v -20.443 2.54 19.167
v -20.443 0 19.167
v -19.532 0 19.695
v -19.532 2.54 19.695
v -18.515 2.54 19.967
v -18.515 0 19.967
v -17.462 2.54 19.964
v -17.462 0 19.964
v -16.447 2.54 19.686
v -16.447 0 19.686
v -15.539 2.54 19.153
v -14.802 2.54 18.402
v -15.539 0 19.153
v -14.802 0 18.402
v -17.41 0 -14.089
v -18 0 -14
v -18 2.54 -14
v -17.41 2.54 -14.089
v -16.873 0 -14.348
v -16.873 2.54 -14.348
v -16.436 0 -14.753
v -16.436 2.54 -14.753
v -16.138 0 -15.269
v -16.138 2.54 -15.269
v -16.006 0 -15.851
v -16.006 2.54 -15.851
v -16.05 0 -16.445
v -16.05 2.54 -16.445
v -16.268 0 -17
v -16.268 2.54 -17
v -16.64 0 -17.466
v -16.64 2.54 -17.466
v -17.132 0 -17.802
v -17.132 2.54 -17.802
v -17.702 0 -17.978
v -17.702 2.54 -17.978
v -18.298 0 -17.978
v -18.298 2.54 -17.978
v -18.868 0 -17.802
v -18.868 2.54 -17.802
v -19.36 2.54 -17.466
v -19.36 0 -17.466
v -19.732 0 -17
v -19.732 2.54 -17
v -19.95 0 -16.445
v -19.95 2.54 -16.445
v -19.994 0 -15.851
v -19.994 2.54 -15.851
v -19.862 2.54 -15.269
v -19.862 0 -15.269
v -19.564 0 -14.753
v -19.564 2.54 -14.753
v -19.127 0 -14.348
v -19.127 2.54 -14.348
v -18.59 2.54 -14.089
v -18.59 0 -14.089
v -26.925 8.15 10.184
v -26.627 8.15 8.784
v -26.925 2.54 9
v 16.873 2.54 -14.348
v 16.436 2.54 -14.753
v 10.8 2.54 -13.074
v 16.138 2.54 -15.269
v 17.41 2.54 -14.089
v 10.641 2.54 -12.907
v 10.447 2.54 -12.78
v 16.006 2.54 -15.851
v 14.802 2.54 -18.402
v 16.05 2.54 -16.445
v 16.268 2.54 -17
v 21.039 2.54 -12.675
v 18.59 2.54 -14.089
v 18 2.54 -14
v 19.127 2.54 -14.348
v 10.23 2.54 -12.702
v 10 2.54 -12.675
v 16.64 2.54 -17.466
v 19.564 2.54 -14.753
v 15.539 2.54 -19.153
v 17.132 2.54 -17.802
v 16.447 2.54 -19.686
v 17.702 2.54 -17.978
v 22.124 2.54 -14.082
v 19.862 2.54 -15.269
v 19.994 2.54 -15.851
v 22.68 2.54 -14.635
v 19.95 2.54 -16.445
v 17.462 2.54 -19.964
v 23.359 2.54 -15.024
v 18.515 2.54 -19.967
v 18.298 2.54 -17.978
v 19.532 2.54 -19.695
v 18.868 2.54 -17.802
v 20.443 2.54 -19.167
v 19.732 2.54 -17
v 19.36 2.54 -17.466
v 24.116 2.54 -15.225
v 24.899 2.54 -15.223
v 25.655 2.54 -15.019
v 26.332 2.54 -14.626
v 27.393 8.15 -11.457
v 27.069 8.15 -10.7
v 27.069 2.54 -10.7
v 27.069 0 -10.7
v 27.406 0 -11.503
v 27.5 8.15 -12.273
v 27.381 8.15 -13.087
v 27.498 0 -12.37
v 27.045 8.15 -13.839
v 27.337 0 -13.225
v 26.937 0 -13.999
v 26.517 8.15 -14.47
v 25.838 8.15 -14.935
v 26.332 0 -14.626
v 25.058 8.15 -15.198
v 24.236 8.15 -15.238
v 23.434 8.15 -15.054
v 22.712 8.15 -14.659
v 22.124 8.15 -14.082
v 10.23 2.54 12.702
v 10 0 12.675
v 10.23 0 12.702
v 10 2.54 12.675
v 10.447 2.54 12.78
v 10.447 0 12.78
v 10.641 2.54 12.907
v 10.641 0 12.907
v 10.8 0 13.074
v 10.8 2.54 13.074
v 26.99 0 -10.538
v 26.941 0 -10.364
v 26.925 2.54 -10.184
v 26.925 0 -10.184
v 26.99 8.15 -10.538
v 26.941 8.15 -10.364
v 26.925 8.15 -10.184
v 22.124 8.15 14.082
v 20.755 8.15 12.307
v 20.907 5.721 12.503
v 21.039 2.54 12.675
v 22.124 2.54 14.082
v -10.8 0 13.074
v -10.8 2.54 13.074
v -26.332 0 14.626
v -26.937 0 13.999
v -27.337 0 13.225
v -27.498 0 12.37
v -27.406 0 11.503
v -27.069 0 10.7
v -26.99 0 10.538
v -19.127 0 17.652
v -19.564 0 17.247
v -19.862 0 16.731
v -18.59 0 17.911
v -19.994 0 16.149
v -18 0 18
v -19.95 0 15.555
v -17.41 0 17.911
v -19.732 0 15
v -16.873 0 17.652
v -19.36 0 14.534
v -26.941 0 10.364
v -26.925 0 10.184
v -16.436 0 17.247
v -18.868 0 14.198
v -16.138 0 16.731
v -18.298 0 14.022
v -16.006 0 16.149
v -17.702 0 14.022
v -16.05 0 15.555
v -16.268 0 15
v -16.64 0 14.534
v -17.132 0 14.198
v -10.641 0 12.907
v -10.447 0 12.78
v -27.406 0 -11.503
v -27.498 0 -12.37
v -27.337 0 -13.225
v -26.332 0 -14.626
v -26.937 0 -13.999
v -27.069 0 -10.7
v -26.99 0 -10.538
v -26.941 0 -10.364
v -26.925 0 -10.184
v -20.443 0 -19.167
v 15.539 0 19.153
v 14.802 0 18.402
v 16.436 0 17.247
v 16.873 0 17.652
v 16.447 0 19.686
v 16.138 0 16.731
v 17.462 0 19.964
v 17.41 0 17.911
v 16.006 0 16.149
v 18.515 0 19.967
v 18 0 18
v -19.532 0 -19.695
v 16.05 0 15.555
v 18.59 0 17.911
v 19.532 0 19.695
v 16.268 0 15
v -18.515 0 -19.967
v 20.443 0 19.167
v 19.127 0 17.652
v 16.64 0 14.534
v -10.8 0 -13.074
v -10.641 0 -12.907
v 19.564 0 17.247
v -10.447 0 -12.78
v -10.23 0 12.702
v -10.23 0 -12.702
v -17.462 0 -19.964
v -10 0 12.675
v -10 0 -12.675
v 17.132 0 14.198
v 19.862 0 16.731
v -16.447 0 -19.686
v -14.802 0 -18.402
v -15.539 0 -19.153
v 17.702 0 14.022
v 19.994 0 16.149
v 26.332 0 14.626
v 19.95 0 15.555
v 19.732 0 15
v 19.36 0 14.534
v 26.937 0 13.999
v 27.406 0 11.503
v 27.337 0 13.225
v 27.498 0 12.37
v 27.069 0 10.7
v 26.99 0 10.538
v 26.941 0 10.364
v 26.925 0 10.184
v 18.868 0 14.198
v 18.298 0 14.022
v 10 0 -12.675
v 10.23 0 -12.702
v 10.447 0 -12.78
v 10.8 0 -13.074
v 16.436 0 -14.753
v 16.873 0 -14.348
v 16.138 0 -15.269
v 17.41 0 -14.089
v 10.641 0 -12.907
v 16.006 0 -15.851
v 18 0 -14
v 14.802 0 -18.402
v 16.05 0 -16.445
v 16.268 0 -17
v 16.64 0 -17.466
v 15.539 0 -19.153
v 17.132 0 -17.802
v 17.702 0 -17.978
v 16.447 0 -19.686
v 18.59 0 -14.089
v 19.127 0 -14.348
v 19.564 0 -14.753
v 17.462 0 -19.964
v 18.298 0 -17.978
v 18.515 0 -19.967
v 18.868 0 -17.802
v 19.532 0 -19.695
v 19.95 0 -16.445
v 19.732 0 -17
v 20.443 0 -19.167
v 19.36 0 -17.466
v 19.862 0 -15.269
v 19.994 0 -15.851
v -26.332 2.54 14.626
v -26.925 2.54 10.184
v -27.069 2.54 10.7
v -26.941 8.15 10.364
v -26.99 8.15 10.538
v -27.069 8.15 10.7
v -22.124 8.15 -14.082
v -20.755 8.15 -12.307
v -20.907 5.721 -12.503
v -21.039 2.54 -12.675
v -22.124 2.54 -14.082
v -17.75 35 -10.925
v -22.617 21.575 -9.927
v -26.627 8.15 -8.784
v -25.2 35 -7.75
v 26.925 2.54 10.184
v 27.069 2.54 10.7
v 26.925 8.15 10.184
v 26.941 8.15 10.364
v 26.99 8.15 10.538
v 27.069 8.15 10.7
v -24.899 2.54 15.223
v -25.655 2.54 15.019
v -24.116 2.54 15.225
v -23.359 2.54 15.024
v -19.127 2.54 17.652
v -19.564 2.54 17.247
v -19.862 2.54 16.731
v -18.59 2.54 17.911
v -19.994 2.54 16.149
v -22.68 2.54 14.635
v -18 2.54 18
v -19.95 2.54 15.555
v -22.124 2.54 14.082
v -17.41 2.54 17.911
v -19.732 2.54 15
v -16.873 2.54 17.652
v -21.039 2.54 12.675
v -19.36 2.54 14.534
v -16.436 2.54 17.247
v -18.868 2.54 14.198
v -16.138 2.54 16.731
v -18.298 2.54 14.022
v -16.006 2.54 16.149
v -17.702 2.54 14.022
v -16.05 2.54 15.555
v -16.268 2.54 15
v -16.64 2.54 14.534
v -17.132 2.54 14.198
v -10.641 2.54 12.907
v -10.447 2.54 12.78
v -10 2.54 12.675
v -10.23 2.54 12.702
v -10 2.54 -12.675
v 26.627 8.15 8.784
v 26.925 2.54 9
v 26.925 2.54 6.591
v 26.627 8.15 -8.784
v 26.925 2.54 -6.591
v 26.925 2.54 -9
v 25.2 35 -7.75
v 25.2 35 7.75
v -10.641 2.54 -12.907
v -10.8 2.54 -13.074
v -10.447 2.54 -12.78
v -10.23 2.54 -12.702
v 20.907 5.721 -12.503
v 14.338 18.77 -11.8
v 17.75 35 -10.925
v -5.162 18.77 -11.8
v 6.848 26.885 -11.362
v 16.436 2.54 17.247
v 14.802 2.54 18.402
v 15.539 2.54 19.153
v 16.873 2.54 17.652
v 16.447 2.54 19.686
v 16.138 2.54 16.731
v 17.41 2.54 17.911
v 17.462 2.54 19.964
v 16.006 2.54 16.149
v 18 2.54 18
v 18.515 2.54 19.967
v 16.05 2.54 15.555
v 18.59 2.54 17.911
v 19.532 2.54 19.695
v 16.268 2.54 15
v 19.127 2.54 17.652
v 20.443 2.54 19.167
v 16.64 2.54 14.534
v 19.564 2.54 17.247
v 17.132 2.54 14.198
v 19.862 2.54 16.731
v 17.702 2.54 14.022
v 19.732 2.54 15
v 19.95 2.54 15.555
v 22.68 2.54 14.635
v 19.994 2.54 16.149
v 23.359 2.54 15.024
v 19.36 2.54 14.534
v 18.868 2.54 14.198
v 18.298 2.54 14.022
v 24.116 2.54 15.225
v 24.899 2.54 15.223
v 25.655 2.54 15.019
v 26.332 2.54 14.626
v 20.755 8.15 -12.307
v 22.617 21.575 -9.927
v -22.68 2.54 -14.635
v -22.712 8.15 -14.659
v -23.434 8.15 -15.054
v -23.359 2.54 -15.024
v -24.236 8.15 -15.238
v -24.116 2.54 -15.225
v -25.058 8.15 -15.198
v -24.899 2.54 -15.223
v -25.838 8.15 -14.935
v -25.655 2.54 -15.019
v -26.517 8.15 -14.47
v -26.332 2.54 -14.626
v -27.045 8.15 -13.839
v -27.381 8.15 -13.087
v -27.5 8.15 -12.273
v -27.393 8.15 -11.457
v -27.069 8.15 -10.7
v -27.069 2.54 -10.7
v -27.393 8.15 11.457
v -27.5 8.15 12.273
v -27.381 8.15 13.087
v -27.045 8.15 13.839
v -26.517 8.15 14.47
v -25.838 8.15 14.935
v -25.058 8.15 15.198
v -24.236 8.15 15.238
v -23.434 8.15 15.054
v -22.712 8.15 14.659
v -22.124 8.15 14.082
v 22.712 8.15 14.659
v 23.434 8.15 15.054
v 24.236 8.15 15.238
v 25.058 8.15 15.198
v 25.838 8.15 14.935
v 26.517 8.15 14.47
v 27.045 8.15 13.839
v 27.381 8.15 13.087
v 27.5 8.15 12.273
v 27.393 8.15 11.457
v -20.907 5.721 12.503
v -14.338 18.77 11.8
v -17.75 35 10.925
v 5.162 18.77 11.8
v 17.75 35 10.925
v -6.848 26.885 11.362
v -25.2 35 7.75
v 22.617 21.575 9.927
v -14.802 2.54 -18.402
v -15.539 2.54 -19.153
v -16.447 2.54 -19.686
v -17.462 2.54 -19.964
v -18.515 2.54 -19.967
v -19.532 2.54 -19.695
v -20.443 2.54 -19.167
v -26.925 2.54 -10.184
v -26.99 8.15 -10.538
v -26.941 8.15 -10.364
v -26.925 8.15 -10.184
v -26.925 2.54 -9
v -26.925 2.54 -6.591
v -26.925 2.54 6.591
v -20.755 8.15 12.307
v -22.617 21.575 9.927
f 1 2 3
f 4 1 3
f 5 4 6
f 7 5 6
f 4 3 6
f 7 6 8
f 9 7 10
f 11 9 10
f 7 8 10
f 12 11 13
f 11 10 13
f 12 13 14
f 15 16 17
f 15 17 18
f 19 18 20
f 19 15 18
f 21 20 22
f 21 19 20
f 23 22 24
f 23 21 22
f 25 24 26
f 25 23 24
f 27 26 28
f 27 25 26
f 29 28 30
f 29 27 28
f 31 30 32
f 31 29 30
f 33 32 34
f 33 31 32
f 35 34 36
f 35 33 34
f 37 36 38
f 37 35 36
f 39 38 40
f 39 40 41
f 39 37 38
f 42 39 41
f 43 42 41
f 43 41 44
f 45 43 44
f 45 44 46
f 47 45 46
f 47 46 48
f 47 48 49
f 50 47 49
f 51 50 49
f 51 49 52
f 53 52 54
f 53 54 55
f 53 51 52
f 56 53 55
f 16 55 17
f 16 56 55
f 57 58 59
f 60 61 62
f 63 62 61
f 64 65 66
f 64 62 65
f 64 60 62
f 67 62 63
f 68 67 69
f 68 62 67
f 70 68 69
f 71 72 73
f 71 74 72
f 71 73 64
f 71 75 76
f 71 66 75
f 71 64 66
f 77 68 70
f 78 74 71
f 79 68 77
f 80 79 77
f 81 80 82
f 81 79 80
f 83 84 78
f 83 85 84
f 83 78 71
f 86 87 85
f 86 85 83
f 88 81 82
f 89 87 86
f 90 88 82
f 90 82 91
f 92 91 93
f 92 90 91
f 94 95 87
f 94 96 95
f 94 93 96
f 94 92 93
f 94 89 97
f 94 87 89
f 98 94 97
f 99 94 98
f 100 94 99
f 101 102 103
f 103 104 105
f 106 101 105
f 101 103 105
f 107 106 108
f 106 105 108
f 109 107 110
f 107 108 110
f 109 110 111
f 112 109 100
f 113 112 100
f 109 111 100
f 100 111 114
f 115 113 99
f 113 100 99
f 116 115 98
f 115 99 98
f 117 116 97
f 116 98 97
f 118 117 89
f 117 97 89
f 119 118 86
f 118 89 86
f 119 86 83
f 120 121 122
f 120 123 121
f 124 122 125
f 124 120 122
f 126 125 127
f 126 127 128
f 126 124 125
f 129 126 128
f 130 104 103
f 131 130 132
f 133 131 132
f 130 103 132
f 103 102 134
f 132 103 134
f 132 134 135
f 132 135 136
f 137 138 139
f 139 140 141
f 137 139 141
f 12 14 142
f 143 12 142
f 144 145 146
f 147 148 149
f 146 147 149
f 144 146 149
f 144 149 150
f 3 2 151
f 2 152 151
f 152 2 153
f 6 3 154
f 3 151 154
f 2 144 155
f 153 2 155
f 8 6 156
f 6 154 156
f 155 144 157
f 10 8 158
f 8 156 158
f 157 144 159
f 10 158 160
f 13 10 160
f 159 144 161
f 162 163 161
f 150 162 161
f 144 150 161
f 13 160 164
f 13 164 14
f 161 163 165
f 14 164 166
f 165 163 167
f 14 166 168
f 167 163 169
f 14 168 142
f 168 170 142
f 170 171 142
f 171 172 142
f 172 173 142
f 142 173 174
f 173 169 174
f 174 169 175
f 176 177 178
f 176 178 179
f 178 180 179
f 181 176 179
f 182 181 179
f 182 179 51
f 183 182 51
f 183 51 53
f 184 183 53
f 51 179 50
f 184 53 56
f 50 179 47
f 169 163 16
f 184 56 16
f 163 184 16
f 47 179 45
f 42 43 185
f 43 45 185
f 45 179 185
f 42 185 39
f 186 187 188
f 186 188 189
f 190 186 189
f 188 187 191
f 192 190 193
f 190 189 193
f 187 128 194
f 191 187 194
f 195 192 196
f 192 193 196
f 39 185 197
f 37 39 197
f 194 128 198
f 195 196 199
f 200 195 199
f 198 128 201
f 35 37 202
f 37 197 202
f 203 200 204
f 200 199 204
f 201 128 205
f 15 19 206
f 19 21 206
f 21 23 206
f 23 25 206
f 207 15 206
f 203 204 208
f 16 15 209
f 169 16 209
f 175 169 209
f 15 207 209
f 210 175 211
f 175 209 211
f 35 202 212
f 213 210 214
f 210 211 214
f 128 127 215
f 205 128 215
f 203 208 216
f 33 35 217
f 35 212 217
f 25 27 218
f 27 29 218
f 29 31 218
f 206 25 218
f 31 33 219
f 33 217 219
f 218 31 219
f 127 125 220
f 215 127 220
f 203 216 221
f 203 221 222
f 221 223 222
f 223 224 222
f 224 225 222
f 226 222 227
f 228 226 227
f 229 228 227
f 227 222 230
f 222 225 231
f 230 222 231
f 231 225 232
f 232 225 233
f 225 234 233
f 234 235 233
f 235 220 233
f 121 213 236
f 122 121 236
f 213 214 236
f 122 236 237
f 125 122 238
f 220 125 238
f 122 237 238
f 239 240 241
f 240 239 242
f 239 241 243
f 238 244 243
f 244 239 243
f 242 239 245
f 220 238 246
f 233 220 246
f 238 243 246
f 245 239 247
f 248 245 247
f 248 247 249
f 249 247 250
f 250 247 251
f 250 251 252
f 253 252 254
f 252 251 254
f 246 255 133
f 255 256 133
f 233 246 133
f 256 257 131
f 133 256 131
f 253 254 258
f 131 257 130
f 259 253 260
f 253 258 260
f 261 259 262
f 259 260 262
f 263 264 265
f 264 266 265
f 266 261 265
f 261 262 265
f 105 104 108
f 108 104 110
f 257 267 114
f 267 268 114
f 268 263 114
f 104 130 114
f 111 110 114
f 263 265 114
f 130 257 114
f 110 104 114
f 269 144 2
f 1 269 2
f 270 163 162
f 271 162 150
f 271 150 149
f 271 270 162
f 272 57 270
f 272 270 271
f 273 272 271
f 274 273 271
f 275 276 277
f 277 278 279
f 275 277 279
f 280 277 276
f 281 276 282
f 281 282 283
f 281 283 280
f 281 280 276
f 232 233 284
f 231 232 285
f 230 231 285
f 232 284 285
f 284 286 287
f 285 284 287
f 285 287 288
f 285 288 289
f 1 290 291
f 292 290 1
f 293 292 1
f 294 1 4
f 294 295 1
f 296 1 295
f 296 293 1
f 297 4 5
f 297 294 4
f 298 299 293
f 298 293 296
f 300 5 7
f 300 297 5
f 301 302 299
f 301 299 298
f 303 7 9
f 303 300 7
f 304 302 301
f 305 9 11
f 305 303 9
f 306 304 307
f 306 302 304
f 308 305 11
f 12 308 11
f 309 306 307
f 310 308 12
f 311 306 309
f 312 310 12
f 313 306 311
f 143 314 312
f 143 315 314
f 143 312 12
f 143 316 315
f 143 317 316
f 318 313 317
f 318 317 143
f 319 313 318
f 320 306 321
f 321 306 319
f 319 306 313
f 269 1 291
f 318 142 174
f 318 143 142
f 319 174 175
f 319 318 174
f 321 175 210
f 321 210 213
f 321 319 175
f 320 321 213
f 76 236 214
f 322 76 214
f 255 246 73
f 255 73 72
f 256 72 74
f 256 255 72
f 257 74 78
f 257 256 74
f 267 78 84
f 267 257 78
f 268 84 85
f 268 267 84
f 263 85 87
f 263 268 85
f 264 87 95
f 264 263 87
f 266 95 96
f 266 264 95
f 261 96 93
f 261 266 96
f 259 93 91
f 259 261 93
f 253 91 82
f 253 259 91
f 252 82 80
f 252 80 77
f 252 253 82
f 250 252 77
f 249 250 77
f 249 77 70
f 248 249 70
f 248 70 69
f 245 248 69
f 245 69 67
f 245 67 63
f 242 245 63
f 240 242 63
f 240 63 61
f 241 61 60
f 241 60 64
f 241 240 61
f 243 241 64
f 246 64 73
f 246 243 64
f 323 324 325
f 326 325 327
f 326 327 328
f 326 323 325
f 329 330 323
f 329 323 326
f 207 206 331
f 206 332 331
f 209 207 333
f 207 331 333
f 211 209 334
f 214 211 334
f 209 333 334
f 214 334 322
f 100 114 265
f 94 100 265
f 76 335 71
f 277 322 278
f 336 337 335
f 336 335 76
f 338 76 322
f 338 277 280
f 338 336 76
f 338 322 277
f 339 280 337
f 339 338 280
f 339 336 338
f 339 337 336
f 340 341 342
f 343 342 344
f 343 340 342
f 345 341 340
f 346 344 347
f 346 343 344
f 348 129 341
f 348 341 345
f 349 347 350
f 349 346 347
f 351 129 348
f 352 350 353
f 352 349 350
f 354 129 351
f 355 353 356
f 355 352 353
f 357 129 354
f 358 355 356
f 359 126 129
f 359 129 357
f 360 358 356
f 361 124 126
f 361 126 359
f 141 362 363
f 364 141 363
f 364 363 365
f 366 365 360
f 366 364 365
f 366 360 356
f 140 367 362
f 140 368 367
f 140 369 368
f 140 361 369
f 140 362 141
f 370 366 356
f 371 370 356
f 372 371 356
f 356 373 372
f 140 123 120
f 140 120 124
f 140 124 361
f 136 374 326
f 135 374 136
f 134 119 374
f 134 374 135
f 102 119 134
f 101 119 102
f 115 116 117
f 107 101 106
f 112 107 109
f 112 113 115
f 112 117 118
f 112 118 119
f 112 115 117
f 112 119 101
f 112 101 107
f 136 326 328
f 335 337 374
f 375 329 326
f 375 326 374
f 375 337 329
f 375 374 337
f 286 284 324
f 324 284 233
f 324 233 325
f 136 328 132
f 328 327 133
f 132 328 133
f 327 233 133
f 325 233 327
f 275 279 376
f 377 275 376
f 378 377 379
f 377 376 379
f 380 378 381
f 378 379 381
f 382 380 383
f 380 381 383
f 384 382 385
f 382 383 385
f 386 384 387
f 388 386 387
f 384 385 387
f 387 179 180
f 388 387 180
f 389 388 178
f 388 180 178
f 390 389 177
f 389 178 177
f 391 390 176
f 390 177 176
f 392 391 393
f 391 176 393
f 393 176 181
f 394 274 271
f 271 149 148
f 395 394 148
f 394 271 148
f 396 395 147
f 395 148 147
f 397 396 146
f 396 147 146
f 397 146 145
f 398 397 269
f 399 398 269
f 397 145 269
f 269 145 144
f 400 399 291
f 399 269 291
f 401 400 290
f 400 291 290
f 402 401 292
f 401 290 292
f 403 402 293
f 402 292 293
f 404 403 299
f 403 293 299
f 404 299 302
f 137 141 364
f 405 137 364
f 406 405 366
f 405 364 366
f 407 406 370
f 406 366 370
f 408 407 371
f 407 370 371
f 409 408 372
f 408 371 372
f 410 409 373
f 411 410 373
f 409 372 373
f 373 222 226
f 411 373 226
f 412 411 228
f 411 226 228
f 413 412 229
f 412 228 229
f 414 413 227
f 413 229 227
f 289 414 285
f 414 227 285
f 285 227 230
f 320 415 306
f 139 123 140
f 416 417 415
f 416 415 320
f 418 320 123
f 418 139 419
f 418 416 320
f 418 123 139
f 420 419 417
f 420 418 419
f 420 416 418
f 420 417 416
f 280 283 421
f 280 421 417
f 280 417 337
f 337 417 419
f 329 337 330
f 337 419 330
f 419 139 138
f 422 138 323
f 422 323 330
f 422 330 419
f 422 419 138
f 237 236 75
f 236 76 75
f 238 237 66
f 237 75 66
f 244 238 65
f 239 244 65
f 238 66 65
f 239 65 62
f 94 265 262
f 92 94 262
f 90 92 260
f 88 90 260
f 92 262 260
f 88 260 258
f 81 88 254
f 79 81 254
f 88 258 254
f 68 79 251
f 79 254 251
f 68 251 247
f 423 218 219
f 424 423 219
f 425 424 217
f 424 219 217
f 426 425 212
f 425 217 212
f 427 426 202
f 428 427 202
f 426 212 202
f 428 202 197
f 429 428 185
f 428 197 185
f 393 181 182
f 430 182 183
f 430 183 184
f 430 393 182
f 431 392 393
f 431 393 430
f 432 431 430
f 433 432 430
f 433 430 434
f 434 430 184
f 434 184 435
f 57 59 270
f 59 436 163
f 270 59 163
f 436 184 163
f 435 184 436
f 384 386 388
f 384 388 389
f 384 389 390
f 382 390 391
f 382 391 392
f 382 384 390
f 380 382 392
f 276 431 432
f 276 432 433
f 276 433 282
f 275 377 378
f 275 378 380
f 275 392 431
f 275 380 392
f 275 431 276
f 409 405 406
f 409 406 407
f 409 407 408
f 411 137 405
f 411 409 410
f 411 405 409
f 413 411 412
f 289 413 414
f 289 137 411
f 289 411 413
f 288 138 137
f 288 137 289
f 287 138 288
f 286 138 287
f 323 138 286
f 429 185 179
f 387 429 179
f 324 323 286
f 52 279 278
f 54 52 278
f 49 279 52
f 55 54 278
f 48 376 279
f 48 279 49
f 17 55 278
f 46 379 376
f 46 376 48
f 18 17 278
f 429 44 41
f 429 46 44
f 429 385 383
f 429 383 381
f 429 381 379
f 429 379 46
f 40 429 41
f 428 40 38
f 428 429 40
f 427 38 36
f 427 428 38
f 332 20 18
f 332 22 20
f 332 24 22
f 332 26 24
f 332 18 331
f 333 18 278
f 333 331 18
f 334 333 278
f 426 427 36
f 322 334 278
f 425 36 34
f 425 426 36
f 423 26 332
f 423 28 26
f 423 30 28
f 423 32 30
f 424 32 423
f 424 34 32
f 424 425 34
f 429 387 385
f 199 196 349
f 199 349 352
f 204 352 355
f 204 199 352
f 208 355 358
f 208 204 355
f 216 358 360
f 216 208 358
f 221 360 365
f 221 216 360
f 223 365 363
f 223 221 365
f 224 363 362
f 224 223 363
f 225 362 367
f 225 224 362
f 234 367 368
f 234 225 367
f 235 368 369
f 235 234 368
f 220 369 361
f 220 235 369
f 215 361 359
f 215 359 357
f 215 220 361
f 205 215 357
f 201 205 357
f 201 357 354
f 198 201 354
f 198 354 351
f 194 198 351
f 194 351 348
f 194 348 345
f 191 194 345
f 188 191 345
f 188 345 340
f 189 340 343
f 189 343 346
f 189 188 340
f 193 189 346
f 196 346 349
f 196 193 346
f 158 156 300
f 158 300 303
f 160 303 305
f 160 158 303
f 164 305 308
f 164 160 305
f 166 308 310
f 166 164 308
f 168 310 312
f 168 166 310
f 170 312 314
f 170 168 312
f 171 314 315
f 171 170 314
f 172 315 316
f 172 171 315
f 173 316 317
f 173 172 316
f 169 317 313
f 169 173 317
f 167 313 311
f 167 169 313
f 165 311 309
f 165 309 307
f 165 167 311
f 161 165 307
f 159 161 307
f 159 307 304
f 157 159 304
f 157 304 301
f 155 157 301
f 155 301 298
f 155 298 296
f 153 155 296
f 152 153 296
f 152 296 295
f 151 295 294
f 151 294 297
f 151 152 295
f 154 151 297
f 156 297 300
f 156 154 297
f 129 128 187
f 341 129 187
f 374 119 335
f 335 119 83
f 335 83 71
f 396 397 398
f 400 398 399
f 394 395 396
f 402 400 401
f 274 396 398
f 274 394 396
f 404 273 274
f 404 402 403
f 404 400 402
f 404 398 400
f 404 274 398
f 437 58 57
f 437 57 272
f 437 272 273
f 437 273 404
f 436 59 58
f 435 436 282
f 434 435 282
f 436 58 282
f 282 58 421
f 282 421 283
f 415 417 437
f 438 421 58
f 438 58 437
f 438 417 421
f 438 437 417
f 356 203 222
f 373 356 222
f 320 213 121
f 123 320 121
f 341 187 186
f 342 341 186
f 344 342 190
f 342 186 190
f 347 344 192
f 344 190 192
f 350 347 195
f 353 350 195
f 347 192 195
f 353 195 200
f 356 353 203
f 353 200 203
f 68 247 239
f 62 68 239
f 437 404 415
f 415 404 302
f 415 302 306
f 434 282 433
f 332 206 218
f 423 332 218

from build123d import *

# Parameters (mm, degrees)
SKETCH3_R           = 2
BOSS_EXTRUDE1_DEPTH = 2.54
FILLET1_R           = 1
BOSS_EXTRUDE2_START = -2.54
BOSS_EXTRUDE2_DEPTH = 8.15
CUT_EXTRUDE1_DEPTH  = 68.045951128
CUT_EXTRUDE2_REACH  = 68.573
CUT_EXTRUDE3_REACH  = 68.573


with BuildPart() as part:
    # Sketch3 → Boss-Extrude1 (new body)
    with BuildSketch(Plane(origin=(0, 0, 0), x_dir=(1, 0, 0), z_dir=(0, 1, 0))):
        with BuildLine():
            Line((-10.5, 12.675), (-14.80167643, 18.402233616))
            ThreePointArc((-14.80167643, 18.402233616), (-17.462309014, 19.963696306), (-20.442771336, 19.167470316))
            Line((-20.442771336, 19.167470316), (-26.332078502, 14.625602737))
            ThreePointArc((-26.332078502, 14.625602737), (-27.469723987, 12.675134617), (-26.925, 10.483824754))
            Line((-26.925, 10.483824754), (-26.925, -10.483824754))
            ThreePointArc((-26.925, -10.483824754), (-27.469723987, -12.675134617), (-26.332078502, -14.625602737))
            Line((-26.332078502, -14.625602737), (-20.442771336, -19.167470316))
            ThreePointArc((-20.442771336, -19.167470316), (-17.462309014, -19.963696306), (-14.80167643, -18.402233616))
            Line((-14.80167643, -18.402233616), (-10.5, -12.675))
            Line((-10.5, -12.675), (10.5, -12.675))
            Line((10.5, -12.675), (14.80167643, -18.402233616))
            ThreePointArc((14.80167643, -18.402233616), (17.462309014, -19.963696306), (20.442771336, -19.167470316))
            Line((20.442771336, -19.167470316), (26.332078502, -14.625602737))
            ThreePointArc((26.332078502, -14.625602737), (27.469723987, -12.675134617), (26.925, -10.483824754))
            Line((26.925, -10.483824754), (26.925, 10.483824754))
            ThreePointArc((26.925, 10.483824754), (27.469723987, 12.675134617), (26.332078502, 14.625602737))
            Line((26.332078502, 14.625602737), (20.442771336, 19.167470316))
            ThreePointArc((20.442771336, 19.167470316), (17.462309014, 19.963696306), (14.80167643, 18.402233616))
            Line((14.80167643, 18.402233616), (10.5, 12.675))
            Line((10.5, 12.675), (-10.5, 12.675))
        make_face()
        with Locations(Location((-18, 16, 0), (0, 0, 270))):
            Circle(SKETCH3_R, mode=Mode.SUBTRACT)
        with Locations(Location((18, 16, 0), (0, 0, 270))):
            Circle(SKETCH3_R, mode=Mode.SUBTRACT)
        with Locations(Location((-18, -16, 0), (0, 0, 270))):
            Circle(SKETCH3_R, mode=Mode.SUBTRACT)
        with Locations(Location((18, -16, 0), (0, 0, 270))):
            Circle(SKETCH3_R, mode=Mode.SUBTRACT)
    extrude(amount=BOSS_EXTRUDE1_DEPTH)

    # Fillet1
    fillet1_edges = [part.edges().sort_by_distance(p)[0] for p in [
        (-26.925, 1.27, 10.483824754),
        (-26.925, 1.27, -10.483824754),
        (-10.5, 1.27, -12.675),
        (10.5, 1.27, -12.675),
        (26.925, 1.27, -10.483824754),
        (26.925, 1.27, 10.483824754),
        (10.5, 1.27, 12.675),
        (-10.5, 1.27, 12.675),
    ]]
    fillet(fillet1_edges, radius=FILLET1_R)

    # Sketch4 → Loft1 section 0
    with BuildSketch(Plane(origin=(0, 2.54, 0), x_dir=(1, 0, 0), z_dir=(0, 1, 0))):
        with BuildLine():
            Line((-26.925, -9), (-21.25, -12.675))
            Line((-21.25, -12.675), (21.25, -12.675))
            Line((21.25, -12.675), (26.925, -9))
            Line((26.925, -9), (26.925, 9))
            Line((26.925, 9), (21.25, 12.675))
            Line((21.25, 12.675), (-21.25, 12.675))
            Line((-21.25, 12.675), (-26.925, 9))
            Line((-26.925, 9), (-26.925, -9))
        make_face()
    # Sketch5 → Loft1 section 1
    with BuildSketch(Plane(origin=(0, 35, 0), x_dir=(1, 0, 0), z_dir=(0, 1, 0))):
        with BuildLine():
            Line((-17.75, -10.925), (17.75, -10.925))
            Line((17.75, -10.925), (25.2, -7.75))
            Line((25.2, -7.75), (25.2, 7.75))
            Line((25.2, 7.75), (17.75, 10.925))
            Line((17.75, 10.925), (-17.75, 10.925))
            Line((-17.75, 10.925), (-25.2, 7.75))
            Line((-25.2, 7.75), (-25.2, -7.75))
            Line((-25.2, -7.75), (-17.75, -10.925))
        make_face()
    loft()

    # Sketch7 → Boss-Extrude2 (add)
    with BuildSketch(Plane(origin=(0, 2.54, 0), x_dir=(1, 0, 0), z_dir=(0, 1, 0)).offset(BOSS_EXTRUDE2_START)):
        with BuildLine():
            Line((-22.124397263, -14.082078502), (-20.292318761, -11.706475765))
            Line((-20.292318761, -11.706475765), (-26.925, -6.591313823))
            Line((-26.925, -6.591313823), (-26.925, -10.183753403))
            ThreePointArc((-26.925, -10.183753403), (-26.961607557, -10.451848535), (-27.06875, -10.700315052))
            ThreePointArc((-27.06875, -10.700315052), (-26.19363735, -14.726205267), (-22.124397263, -14.082078502))
        make_face()
        with BuildLine():
            Line((-26.925, 10.183753403), (-26.925, 6.591313823))
            Line((-26.925, 6.591313823), (-20.292318761, 11.706475765))
            Line((-20.292318761, 11.706475765), (-22.124397263, 14.082078502))
            ThreePointArc((-22.124397263, 14.082078502), (-26.19363735, 14.726205267), (-27.06875, 10.700315052))
            ThreePointArc((-27.06875, 10.700315052), (-26.961607557, 10.451848535), (-26.925, 10.183753403))
        make_face()
        with BuildLine():
            Line((26.925, -10.183753403), (26.925, -6.591313823))
            Line((26.925, -6.591313823), (20.292318761, -11.706475765))
            Line((20.292318761, -11.706475765), (22.124397263, -14.082078502))
            ThreePointArc((22.124397263, -14.082078502), (26.19363735, -14.726205267), (27.06875, -10.700315052))
            ThreePointArc((27.06875, -10.700315052), (26.961607557, -10.451848535), (26.925, -10.183753403))
        make_face()
        with BuildLine():
            Line((22.124397263, 14.082078502), (20.292318761, 11.706475765))
            Line((20.292318761, 11.706475765), (26.925, 6.591313823))
            Line((26.925, 6.591313823), (26.925, 10.183753403))
            ThreePointArc((26.925, 10.183753403), (26.961607557, 10.451848535), (27.06875, 10.700315052))
            ThreePointArc((27.06875, 10.700315052), (26.19363735, 14.726205267), (22.124397263, 14.082078502))
        make_face()
    extrude(amount=BOSS_EXTRUDE2_DEPTH)

    # Sketch8 → Cut-Extrude1 (cut, through all)
    with BuildSketch(Plane(origin=(26.98377644, 1.433980726, 0), x_dir=(0, 0, -1), z_dir=(0.9985909302546928, 0.05306744777231502, 0))):
        Polygon((-9, 1.107579931), (9, 1.107579931), (7.75, 33.613382875), (-7.75, 33.613382875), align=None)
    cut_extrude1 = extrude(amount=CUT_EXTRUDE1_DEPTH, mode=Mode.SUBTRACT)

    # Sketch9 → Cut-Extrude2 (cut, up to next)
    with BuildSketch(Plane(origin=(23.985855334, 1.077940045, -5.108533277), x_dir=(-0.20789815344793566, -0.00934307914900991, -0.9781058555519203), z_dir=(0.9771196273503368, 0.04391239587739548, -0.20810798959926086)), mode=Mode.PRIVATE) as cut_extrude2_sk1:
        Polygon((-15.634592712, 6.932975266), (-14.203471003, 6.946359845), (-14.424341903, 1.328631852), align=None)
    cut_extrude2_tool1 = extrude(cut_extrude2_sk1.sketch, amount=CUT_EXTRUDE2_REACH, mode=Mode.PRIVATE) & part.part
    cut_extrude2 = cut_extrude2_tool1.solids().sort_by_distance((26.825624, 6.28, 9.322573))[0]
    add(cut_extrude2, mode=Mode.SUBTRACT)

    # Sketch10 → Cut-Extrude3 (cut, up to next)
    with BuildSketch(Plane(origin=(23.985855334, 1.077940045, 5.108533278), x_dir=(0.2078981534584427, 0.009343079149391592, -0.9781058555496834), z_dir=(0.9771196273481212, 0.04391239587687057, 0.20810798960977442)), mode=Mode.PRIVATE) as cut_extrude3_sk1:
        Polygon((14.424341903, 1.328631852), (15.634592712, 6.932975266), (14.203471003, 6.946359845), align=None)
    cut_extrude3_tool1 = extrude(cut_extrude3_sk1.sketch, amount=CUT_EXTRUDE3_REACH, mode=Mode.PRIVATE) & part.part
    cut_extrude3 = cut_extrude3_tool1.solids().sort_by_distance((26.825624, 6.28, -9.322573))[0]
    add(cut_extrude3, mode=Mode.SUBTRACT)

    # Mirror1: Cut-Extrude1, Cut-Extrude2, Cut-Extrude3 across plane
    add(cut_extrude1.mirror(Plane(origin=(0, 0, 0), x_dir=(0, 0, 1), z_dir=(1, 0, 0))), mode=Mode.SUBTRACT)
    add(cut_extrude2.mirror(Plane(origin=(0, 0, 0), x_dir=(0, 0, 1), z_dir=(1, 0, 0))), mode=Mode.SUBTRACT)
    add(cut_extrude3.mirror(Plane(origin=(0, 0, 0), x_dir=(0, 0, 1), z_dir=(1, 0, 0))), mode=Mode.SUBTRACT)


solid = part.part
